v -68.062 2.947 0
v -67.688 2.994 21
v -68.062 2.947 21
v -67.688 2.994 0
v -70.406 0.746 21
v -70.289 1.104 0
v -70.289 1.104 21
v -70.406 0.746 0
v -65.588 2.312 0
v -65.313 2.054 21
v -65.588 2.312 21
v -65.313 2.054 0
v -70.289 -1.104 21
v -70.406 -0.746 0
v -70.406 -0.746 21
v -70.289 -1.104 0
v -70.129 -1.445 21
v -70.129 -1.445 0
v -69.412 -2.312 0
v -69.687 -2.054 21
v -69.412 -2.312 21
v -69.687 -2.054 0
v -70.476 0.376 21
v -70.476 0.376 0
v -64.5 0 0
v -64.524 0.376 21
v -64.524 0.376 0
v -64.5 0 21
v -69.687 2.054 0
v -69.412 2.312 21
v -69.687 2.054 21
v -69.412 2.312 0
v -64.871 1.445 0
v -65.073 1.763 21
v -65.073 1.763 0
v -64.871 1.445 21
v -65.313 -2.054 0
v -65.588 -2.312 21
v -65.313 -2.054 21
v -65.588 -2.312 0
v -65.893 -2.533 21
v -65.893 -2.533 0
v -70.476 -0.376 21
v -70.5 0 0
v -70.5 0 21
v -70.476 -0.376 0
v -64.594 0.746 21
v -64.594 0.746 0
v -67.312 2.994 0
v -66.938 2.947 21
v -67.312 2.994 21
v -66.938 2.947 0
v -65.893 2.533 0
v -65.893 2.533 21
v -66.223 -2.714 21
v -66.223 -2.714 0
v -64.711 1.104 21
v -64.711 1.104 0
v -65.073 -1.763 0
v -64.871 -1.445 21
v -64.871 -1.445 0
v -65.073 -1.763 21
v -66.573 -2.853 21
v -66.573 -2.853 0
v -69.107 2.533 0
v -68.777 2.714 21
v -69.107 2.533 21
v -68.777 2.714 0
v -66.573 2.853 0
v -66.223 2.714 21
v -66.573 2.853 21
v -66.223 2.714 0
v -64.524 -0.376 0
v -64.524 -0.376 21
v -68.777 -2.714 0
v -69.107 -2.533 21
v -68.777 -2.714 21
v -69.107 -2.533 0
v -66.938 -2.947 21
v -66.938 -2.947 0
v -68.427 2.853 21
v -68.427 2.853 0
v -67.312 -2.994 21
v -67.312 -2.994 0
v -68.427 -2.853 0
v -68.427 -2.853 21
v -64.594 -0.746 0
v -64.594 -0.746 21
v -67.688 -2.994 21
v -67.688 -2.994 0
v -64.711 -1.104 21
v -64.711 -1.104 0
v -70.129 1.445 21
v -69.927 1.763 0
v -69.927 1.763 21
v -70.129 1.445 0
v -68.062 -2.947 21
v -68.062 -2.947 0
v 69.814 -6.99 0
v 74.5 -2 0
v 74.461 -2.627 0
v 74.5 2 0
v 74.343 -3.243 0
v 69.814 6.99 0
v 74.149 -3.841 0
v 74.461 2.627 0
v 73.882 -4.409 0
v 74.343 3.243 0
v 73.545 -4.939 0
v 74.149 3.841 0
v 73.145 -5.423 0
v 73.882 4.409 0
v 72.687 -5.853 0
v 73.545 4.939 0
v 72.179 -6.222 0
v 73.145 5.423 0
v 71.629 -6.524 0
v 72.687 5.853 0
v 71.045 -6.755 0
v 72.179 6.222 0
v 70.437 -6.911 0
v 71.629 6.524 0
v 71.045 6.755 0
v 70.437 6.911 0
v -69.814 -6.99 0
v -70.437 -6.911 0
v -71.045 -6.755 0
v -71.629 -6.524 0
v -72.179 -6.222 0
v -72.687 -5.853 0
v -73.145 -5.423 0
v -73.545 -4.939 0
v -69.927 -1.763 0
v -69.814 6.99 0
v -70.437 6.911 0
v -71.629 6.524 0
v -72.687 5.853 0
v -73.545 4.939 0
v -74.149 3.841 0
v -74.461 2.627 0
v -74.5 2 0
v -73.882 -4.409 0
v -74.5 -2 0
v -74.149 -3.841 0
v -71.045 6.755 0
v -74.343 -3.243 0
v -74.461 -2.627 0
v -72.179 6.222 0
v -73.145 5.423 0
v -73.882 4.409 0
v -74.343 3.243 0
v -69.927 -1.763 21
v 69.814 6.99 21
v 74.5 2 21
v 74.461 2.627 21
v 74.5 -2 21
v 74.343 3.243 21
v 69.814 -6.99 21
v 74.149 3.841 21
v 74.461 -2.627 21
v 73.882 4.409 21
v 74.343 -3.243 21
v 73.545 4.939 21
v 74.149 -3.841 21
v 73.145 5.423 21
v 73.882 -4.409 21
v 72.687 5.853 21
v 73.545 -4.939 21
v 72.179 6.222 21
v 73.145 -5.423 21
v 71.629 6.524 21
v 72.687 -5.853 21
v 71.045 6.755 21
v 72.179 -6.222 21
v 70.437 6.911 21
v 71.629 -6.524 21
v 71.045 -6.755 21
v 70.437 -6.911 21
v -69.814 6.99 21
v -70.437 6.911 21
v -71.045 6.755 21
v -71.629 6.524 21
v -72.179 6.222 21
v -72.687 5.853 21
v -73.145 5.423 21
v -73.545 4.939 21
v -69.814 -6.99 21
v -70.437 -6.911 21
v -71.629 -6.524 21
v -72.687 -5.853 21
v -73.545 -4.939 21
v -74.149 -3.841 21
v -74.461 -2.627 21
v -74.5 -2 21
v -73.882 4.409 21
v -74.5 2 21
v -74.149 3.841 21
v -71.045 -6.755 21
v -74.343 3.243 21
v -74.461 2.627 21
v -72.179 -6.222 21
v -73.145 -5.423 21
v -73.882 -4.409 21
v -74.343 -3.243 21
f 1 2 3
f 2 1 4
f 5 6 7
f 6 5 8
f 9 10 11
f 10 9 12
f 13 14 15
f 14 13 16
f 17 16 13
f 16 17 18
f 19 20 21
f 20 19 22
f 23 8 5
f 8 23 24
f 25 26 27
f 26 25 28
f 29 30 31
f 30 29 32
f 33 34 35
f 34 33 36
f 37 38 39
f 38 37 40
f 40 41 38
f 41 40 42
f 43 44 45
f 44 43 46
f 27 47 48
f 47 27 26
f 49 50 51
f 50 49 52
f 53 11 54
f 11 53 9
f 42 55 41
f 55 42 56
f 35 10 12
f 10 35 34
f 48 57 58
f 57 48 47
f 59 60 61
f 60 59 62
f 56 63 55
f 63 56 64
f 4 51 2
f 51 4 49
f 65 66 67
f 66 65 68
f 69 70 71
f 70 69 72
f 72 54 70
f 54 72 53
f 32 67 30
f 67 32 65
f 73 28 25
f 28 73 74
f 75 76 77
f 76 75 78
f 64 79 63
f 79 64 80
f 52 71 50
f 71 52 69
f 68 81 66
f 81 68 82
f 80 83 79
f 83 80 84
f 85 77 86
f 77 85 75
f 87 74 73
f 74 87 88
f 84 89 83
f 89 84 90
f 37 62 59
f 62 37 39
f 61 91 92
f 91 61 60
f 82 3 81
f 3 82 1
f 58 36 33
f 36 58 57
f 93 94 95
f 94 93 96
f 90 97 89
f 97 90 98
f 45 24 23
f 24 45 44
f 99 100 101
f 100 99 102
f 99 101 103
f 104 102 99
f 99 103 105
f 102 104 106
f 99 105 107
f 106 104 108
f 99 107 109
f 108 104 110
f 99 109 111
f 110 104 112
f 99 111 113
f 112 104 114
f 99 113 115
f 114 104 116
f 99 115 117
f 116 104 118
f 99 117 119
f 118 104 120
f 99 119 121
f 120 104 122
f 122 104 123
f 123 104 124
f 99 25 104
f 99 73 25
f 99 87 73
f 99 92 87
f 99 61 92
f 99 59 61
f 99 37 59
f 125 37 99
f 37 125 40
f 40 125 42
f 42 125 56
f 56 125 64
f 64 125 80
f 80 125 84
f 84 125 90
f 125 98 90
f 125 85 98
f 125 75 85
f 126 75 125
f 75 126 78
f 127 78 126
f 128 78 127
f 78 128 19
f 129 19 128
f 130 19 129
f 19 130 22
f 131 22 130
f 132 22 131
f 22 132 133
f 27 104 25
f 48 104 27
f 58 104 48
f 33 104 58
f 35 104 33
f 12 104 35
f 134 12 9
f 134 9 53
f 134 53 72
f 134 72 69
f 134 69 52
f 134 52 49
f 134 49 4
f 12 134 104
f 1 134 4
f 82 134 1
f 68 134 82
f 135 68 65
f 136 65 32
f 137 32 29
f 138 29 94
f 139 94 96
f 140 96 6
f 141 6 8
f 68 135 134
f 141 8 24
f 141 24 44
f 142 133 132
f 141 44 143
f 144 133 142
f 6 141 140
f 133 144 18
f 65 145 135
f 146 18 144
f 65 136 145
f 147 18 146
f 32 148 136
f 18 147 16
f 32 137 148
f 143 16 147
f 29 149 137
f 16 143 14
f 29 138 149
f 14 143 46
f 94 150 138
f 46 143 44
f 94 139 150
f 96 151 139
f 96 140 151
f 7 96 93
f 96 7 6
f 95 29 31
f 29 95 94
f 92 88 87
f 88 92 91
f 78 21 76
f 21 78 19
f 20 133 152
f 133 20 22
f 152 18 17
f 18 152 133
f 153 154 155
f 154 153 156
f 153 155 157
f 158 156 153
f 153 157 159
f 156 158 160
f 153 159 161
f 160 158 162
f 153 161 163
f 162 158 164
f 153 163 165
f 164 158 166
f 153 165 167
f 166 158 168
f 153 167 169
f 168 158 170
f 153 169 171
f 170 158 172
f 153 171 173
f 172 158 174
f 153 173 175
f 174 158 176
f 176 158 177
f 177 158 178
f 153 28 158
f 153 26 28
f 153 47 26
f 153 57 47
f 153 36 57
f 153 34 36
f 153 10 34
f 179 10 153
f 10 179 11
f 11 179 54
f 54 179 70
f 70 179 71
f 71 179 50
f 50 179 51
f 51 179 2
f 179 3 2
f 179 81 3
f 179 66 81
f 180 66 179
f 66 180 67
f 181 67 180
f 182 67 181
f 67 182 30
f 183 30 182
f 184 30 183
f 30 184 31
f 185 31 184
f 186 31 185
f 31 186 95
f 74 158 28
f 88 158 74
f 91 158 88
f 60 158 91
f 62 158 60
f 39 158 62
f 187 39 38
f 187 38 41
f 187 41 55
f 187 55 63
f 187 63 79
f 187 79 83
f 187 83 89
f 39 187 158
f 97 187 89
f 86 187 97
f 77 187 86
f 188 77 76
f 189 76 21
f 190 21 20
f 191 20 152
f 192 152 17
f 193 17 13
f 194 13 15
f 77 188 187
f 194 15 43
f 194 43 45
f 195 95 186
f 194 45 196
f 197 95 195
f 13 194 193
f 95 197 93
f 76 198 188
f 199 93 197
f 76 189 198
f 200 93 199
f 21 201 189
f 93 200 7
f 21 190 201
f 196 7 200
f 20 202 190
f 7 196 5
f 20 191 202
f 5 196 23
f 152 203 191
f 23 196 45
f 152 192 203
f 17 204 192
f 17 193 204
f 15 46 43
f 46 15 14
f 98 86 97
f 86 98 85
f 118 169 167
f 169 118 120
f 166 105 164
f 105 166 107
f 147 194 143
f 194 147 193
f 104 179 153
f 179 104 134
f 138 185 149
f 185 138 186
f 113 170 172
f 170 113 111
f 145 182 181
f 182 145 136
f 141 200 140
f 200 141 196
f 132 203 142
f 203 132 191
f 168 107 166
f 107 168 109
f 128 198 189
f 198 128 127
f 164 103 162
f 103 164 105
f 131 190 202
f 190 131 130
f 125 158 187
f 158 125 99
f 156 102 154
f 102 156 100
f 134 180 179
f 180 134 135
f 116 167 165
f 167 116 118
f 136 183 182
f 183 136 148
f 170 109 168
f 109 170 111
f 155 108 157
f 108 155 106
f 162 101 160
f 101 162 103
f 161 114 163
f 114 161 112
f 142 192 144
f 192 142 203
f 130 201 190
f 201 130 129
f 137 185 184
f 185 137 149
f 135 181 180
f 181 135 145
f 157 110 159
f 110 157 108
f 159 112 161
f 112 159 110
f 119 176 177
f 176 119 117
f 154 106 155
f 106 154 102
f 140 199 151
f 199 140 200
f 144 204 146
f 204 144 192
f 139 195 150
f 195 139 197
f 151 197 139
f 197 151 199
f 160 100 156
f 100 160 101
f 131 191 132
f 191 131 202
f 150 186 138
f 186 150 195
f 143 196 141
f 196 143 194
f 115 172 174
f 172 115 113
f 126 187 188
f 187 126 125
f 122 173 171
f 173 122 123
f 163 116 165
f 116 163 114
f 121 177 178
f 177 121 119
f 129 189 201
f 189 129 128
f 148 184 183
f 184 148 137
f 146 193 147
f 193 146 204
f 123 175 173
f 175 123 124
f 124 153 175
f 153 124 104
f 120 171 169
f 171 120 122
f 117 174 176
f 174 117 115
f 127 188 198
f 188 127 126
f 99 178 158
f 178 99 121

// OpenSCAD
$fn = 50;


difference() {
	union() {
		hull() {
			translate(v = [-69.5000000000, 2.0000000000, 0]) {
				cylinder(h = 21, r = 5);
			}
			translate(v = [69.5000000000, 2.0000000000, 0]) {
				cylinder(h = 21, r = 5);
			}
			translate(v = [-69.5000000000, -2.0000000000, 0]) {
				cylinder(h = 21, r = 5);
			}
			translate(v = [69.5000000000, -2.0000000000, 0]) {
				cylinder(h = 21, r = 5);
			}
		}
	}
	union() {
		translate(v = [-67.5000000000, 0.0000000000, 0]) {
			cylinder(h = 21, r = 3.0000000000);
		}
		translate(v = [-67.5000000000, 0.0000000000, 0]) {
			cylinder(h = 21, r = 1.5000000000);
		}
		translate(v = [-67.5000000000, 0.0000000000, 0]) {
			cylinder(h = 21, r = 1.5000000000);
		}
		translate(v = [-67.5000000000, 0.0000000000, 0]) {
			cylinder(h = 21, r = 1.5000000000);
		}
	}
}
